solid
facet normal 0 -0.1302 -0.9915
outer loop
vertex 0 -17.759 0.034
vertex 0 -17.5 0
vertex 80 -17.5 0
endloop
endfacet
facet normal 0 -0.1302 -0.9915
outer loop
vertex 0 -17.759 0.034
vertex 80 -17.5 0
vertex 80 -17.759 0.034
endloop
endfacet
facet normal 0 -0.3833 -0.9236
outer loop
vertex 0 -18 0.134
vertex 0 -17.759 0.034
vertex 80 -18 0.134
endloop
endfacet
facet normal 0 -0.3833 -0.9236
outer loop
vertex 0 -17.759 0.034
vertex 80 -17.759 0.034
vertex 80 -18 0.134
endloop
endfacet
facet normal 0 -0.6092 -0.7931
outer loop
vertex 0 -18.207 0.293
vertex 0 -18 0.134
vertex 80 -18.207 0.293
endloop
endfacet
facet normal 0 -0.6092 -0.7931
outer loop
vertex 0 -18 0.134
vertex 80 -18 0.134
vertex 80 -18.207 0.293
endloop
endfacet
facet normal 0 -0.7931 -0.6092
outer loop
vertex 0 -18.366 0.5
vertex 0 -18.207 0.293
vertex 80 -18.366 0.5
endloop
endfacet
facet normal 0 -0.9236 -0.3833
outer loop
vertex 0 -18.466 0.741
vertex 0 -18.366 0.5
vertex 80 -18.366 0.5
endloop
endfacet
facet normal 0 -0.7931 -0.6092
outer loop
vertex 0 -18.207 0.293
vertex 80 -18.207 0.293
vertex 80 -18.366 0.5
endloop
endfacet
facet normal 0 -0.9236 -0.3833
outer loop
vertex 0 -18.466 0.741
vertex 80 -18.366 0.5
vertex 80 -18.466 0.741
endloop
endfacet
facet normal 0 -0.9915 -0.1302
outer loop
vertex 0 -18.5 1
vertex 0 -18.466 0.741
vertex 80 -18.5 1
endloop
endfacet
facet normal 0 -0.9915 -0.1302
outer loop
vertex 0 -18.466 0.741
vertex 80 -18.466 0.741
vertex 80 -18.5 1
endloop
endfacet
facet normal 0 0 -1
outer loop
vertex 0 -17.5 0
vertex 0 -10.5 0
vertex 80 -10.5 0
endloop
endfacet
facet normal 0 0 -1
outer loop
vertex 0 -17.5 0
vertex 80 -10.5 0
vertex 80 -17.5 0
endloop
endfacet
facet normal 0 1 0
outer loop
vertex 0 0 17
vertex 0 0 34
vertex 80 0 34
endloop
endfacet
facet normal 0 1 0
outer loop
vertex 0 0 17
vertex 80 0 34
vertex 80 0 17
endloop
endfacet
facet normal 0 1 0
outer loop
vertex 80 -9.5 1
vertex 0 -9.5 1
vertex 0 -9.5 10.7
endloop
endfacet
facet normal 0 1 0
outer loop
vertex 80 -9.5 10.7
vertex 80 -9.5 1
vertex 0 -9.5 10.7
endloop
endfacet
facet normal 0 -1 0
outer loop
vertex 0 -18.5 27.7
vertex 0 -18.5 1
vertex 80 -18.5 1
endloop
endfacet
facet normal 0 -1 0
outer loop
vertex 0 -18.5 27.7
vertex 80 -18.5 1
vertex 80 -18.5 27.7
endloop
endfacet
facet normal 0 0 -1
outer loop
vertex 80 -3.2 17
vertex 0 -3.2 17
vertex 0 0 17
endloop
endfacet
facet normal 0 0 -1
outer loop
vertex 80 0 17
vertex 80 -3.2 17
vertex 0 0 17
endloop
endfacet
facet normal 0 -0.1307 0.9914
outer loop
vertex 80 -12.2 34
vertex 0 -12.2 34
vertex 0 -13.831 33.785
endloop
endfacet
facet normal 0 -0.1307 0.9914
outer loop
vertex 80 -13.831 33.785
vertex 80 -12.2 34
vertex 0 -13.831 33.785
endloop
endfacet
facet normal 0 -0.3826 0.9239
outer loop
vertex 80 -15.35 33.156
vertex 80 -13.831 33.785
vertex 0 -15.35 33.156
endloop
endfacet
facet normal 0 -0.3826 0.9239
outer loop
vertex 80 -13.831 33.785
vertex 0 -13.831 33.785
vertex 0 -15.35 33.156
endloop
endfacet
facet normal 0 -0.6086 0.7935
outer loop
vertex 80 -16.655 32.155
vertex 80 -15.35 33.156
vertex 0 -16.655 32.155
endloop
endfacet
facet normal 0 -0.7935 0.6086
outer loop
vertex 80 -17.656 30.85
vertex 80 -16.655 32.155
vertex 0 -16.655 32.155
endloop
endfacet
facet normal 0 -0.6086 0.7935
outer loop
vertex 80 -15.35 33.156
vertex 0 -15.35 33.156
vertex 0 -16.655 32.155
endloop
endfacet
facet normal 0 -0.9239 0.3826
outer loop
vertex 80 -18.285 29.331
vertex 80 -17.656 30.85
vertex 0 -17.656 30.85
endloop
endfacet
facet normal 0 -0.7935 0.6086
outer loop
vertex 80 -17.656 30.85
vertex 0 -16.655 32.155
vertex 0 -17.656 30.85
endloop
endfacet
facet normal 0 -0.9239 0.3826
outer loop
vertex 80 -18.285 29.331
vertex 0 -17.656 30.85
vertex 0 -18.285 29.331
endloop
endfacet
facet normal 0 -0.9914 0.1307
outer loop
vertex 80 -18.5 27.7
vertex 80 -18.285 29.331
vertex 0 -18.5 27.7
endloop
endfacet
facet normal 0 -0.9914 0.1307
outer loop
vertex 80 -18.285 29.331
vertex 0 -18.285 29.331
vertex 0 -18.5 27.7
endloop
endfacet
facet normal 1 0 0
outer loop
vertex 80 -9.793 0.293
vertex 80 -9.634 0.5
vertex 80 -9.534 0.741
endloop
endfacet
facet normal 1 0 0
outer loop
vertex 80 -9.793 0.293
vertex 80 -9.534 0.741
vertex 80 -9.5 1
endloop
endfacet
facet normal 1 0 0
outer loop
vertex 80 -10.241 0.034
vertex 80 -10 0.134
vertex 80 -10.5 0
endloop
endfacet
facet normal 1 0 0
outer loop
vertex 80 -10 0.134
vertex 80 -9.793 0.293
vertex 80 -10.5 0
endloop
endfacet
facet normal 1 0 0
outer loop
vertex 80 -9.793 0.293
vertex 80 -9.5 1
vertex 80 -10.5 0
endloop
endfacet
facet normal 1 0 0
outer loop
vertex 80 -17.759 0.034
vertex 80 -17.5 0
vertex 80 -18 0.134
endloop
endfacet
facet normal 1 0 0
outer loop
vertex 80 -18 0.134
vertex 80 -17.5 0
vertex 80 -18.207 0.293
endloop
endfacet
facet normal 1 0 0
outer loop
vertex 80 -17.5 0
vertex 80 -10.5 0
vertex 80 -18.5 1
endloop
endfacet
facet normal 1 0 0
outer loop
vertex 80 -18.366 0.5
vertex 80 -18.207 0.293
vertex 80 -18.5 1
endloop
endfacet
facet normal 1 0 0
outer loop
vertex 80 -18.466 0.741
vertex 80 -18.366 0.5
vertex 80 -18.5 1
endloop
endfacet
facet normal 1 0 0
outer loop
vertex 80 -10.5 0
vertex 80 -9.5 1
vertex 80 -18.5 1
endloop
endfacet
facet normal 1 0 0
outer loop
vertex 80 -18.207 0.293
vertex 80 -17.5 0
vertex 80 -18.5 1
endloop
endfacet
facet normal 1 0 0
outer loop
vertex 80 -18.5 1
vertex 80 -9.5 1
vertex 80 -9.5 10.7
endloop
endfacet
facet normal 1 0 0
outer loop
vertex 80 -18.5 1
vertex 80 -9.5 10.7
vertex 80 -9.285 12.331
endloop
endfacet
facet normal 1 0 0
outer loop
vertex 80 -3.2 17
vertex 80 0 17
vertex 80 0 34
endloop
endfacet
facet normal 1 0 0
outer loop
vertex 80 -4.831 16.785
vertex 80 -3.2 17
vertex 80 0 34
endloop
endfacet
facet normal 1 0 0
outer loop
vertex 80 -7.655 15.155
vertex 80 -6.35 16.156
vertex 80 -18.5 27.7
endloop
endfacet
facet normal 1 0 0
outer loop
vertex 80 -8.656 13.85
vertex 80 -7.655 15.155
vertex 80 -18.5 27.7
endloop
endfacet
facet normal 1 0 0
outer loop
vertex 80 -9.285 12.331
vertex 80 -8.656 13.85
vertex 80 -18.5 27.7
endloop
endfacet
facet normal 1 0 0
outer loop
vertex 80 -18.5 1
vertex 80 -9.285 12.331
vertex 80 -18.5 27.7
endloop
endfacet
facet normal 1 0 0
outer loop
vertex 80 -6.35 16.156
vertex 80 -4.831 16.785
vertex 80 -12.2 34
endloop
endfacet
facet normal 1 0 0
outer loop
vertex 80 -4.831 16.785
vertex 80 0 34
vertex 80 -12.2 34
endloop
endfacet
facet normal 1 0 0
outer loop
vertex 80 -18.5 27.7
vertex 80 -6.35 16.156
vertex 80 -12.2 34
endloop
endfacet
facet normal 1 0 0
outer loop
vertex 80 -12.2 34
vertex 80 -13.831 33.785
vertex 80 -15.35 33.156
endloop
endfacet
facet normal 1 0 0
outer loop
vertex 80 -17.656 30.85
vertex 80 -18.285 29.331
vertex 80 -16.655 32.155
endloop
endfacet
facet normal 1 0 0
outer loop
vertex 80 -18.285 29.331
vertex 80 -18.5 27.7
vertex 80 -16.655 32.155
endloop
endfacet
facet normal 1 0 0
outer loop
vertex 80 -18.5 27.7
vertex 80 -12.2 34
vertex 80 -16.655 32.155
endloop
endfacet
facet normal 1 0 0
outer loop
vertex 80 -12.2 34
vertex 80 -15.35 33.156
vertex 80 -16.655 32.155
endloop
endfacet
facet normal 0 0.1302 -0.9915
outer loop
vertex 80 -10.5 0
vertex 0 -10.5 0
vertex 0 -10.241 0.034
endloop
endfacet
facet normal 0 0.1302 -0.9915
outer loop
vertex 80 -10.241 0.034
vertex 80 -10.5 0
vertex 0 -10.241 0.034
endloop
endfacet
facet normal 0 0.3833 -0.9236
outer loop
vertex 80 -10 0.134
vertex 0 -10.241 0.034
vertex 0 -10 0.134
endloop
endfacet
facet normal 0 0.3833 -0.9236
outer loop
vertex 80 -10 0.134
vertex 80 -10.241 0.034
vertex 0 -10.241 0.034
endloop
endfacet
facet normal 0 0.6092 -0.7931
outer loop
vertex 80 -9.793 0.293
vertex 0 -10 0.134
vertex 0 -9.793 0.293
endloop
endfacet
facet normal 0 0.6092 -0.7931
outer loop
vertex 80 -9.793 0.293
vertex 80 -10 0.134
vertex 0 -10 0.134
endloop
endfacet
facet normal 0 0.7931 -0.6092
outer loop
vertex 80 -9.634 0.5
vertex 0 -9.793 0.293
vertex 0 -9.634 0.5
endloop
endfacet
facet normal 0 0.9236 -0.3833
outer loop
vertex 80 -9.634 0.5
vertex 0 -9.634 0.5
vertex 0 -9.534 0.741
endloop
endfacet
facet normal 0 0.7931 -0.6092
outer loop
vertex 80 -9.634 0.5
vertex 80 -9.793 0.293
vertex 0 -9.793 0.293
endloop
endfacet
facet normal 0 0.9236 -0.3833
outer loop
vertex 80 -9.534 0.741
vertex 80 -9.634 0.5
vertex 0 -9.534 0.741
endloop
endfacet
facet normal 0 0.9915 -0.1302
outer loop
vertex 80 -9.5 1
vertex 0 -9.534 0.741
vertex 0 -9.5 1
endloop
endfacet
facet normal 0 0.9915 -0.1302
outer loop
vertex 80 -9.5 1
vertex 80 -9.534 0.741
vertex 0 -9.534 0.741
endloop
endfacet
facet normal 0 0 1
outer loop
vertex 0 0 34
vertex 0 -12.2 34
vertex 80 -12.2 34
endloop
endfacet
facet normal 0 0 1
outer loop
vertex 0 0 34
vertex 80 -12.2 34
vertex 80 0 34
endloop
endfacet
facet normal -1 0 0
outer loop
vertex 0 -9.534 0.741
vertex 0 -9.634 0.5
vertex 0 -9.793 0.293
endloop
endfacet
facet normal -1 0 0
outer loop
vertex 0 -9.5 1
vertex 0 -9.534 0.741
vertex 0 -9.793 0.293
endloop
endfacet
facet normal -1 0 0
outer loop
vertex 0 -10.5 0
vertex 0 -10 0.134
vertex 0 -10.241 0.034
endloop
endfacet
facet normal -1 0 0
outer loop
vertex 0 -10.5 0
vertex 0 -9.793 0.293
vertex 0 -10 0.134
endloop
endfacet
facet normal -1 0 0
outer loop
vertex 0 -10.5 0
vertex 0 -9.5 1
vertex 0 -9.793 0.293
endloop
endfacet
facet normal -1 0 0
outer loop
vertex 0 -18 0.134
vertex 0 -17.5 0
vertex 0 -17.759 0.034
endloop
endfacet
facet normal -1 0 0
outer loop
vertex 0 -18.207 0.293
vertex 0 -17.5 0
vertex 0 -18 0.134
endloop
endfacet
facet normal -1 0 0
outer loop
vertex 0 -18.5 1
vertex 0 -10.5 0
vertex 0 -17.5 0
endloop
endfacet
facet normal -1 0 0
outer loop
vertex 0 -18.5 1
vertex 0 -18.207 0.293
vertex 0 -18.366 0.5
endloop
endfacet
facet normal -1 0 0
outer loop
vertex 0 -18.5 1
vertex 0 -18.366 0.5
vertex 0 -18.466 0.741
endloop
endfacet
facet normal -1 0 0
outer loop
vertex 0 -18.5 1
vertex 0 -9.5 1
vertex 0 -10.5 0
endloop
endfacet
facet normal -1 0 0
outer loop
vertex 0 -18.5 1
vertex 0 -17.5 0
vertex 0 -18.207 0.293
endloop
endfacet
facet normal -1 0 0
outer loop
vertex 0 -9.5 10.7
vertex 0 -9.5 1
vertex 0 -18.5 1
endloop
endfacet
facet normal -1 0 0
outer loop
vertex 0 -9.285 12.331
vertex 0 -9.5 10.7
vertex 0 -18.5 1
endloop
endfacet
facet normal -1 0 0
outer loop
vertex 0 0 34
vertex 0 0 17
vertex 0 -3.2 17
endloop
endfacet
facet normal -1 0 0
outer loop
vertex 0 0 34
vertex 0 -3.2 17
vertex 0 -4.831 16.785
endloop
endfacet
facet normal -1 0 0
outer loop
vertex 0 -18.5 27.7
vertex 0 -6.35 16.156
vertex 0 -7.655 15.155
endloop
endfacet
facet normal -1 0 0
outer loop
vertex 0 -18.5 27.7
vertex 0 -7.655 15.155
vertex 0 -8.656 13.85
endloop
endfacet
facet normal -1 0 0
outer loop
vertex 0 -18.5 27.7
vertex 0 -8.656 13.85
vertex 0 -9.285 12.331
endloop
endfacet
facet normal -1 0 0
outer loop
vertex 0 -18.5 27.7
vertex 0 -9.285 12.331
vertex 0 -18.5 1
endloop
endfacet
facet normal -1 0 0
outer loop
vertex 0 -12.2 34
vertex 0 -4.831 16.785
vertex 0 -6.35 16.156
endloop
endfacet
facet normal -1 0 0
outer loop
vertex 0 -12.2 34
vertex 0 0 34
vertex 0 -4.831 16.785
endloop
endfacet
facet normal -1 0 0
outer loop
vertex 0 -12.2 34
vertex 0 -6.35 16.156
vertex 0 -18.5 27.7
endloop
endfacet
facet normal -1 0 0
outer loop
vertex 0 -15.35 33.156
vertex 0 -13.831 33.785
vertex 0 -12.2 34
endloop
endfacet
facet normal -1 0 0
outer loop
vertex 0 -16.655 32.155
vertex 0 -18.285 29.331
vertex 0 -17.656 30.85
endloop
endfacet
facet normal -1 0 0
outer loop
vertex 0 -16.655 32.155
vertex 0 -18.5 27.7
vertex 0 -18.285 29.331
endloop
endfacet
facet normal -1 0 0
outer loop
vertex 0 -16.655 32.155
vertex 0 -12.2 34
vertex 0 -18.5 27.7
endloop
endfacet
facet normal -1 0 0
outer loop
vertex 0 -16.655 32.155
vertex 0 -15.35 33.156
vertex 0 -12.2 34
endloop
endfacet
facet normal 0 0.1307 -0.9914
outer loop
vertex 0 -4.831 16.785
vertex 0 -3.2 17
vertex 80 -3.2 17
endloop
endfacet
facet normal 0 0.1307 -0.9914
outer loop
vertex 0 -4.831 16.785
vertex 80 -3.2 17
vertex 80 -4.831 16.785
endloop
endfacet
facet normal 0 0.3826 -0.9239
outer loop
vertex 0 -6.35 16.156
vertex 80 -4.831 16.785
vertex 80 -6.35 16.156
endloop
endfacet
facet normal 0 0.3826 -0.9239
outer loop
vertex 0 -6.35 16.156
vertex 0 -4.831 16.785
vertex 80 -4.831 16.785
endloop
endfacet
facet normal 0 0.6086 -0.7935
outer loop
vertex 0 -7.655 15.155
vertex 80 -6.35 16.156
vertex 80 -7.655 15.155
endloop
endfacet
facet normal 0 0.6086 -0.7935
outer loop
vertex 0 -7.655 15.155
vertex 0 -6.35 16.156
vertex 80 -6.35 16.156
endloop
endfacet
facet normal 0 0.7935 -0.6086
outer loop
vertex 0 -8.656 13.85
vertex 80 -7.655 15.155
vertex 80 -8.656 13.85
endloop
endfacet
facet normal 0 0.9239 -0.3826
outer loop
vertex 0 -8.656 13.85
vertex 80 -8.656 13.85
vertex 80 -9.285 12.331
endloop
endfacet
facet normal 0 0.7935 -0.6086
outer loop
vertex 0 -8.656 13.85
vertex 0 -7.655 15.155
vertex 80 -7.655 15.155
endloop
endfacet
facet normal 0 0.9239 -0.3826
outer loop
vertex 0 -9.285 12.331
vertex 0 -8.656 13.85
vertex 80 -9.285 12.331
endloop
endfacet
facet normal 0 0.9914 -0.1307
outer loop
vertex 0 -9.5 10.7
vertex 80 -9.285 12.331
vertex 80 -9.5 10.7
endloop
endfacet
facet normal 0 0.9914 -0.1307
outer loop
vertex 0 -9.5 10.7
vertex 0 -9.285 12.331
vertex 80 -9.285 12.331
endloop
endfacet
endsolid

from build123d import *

# Parameters (mm, degrees)
PAD_DEPTH = 80
FILLET_R  = 1


with BuildPart() as part:
    # Sketch → Pad (new body)
    with BuildSketch(Plane.YZ):
        with BuildLine():
            Line((-9.5, 0), (-18.5, 0))
            Line((-18.5, 0), (-18.5, 27.7))
            ThreePointArc((-12.2, 34), (-16.654773, 32.154773), (-18.5, 27.7))
            Line((-12.2, 34), (0, 34))
            Line((0, 34), (0, 17))
            Line((-3.2, 17), (0, 17))
            ThreePointArc((-3.2, 17), (-7.654773, 15.154773), (-9.5, 10.7))
            Line((-9.5, 0), (-9.5, 10.7))
        make_face()
    extrude(amount=PAD_DEPTH)

    # Fillet
    fillet_edges = [part.edges().sort_by_distance(p)[0] for p in [
        (40, -18.5, 0),
        (40, -9.5, 0),
    ]]
    fillet(fillet_edges, radius=FILLET_R)


solid = part.part
